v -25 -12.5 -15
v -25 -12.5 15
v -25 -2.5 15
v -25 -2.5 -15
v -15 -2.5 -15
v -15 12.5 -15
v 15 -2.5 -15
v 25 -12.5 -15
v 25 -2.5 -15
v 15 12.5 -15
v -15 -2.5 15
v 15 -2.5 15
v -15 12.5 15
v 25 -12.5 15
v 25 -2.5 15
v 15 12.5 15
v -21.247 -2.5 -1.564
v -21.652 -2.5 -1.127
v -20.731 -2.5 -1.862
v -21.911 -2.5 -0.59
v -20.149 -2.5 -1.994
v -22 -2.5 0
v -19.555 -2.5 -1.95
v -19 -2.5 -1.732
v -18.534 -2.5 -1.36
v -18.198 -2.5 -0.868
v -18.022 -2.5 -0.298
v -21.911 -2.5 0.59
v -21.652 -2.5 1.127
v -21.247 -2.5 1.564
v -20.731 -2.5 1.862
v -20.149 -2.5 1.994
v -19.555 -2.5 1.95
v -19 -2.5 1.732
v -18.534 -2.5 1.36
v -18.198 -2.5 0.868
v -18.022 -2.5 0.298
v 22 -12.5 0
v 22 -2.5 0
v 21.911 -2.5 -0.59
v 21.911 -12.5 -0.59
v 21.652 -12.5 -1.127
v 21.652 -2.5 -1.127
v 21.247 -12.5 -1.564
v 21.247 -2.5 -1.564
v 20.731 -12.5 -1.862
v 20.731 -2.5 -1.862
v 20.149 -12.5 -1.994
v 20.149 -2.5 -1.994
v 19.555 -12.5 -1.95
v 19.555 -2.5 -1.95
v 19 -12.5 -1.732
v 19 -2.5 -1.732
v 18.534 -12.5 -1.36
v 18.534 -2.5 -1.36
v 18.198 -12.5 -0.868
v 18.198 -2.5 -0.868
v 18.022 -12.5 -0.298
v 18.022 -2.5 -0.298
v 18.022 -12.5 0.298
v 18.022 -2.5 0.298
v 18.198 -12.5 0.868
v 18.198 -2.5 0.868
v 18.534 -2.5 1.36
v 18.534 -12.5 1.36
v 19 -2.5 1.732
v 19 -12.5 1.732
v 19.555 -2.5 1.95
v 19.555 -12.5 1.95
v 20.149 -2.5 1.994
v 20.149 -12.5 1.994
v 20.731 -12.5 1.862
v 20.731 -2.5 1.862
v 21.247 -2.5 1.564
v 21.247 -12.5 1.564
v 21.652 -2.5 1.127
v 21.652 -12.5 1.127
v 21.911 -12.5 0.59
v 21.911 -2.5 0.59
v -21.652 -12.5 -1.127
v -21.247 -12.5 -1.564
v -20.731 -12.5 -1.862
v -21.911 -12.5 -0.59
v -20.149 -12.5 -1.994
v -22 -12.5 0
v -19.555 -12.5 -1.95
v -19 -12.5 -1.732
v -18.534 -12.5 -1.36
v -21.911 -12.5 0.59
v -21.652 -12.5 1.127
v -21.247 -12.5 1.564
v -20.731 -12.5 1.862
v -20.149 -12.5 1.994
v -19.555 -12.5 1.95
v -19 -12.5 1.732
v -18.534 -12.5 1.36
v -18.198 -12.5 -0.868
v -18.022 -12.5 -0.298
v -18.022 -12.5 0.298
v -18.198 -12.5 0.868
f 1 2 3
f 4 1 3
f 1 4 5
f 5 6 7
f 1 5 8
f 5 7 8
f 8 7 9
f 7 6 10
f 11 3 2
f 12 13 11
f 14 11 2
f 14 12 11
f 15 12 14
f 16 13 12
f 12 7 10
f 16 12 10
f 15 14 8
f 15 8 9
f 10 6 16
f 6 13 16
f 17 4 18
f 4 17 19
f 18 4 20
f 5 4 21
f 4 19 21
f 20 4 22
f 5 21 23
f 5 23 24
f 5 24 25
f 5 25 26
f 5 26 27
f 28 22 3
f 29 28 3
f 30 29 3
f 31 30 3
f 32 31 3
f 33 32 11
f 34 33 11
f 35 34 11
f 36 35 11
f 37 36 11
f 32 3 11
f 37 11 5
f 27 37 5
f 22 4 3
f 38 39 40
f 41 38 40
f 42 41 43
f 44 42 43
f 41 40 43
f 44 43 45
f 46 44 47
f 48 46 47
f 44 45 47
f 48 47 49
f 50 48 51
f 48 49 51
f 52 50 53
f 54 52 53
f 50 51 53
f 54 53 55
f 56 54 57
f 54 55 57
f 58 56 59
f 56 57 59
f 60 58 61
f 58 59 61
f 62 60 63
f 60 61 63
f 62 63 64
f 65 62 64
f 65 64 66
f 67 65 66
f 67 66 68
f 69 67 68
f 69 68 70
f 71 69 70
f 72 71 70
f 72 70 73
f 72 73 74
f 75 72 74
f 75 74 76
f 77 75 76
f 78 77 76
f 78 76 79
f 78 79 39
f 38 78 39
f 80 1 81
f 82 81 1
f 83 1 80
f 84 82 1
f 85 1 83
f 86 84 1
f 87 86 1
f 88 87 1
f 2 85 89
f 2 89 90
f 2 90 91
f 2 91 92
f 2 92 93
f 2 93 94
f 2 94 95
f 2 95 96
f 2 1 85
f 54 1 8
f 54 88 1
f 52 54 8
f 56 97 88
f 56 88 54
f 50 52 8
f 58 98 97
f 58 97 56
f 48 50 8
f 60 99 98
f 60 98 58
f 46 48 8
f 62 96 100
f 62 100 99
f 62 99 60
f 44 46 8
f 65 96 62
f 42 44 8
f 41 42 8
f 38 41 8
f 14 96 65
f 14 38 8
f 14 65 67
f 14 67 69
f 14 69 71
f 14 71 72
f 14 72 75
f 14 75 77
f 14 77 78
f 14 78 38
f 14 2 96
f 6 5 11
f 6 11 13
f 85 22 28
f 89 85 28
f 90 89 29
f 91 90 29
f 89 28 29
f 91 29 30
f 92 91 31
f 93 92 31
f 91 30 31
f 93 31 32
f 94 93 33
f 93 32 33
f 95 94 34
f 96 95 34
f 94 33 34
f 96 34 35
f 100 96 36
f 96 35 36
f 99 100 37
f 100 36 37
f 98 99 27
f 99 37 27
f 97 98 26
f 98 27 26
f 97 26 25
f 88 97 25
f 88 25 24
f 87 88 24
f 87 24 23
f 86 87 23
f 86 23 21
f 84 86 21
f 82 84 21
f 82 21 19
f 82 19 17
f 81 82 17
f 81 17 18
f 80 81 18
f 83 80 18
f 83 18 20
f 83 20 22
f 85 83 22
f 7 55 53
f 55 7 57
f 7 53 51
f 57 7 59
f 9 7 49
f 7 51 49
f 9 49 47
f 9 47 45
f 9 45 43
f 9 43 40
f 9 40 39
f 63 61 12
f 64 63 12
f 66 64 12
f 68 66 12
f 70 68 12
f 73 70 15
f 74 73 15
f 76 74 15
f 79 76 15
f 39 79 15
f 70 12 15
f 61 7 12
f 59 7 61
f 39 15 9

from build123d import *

# Parameters (mm, degrees)
CROQUIS1_W              = 10
CROQUIS1_H              = 10
CROQUIS1_W_2            = 30
CROQUIS1_H_2            = 25
SALIENTE_EXTRUIR1_DEPTH = 15
CROQUIS2_R              = 2
CORTAR_EXTRUIR1_DEPTH   = 30


with BuildPart() as part:
    # Croquis1 → Saliente-Extruir1 (new, symmetric)
    with BuildSketch(Plane.XY):
        with Locations((-20, -7.5)):
            Rectangle(CROQUIS1_W, CROQUIS1_H)
        Rectangle(CROQUIS1_W_2, CROQUIS1_H_2)
        with Locations((20, -7.5)):
            Rectangle(CROQUIS1_W, CROQUIS1_H)
    extrude(amount=SALIENTE_EXTRUIR1_DEPTH, both=True)

    # Croquis2 → Cortar-Extruir1 (cut)
    with BuildSketch(Plane(origin=(0, -2.5, 0), x_dir=(1, 0, 0), z_dir=(0, 1, 0))):
        with Locations(Location((-20, 0, 0), (0, 0, 180))):
            Circle(CROQUIS2_R)
        with Locations((20, 0)):
            Circle(CROQUIS2_R)
    extrude(amount=-CORTAR_EXTRUIR1_DEPTH, mode=Mode.SUBTRACT)


solid = part.part
